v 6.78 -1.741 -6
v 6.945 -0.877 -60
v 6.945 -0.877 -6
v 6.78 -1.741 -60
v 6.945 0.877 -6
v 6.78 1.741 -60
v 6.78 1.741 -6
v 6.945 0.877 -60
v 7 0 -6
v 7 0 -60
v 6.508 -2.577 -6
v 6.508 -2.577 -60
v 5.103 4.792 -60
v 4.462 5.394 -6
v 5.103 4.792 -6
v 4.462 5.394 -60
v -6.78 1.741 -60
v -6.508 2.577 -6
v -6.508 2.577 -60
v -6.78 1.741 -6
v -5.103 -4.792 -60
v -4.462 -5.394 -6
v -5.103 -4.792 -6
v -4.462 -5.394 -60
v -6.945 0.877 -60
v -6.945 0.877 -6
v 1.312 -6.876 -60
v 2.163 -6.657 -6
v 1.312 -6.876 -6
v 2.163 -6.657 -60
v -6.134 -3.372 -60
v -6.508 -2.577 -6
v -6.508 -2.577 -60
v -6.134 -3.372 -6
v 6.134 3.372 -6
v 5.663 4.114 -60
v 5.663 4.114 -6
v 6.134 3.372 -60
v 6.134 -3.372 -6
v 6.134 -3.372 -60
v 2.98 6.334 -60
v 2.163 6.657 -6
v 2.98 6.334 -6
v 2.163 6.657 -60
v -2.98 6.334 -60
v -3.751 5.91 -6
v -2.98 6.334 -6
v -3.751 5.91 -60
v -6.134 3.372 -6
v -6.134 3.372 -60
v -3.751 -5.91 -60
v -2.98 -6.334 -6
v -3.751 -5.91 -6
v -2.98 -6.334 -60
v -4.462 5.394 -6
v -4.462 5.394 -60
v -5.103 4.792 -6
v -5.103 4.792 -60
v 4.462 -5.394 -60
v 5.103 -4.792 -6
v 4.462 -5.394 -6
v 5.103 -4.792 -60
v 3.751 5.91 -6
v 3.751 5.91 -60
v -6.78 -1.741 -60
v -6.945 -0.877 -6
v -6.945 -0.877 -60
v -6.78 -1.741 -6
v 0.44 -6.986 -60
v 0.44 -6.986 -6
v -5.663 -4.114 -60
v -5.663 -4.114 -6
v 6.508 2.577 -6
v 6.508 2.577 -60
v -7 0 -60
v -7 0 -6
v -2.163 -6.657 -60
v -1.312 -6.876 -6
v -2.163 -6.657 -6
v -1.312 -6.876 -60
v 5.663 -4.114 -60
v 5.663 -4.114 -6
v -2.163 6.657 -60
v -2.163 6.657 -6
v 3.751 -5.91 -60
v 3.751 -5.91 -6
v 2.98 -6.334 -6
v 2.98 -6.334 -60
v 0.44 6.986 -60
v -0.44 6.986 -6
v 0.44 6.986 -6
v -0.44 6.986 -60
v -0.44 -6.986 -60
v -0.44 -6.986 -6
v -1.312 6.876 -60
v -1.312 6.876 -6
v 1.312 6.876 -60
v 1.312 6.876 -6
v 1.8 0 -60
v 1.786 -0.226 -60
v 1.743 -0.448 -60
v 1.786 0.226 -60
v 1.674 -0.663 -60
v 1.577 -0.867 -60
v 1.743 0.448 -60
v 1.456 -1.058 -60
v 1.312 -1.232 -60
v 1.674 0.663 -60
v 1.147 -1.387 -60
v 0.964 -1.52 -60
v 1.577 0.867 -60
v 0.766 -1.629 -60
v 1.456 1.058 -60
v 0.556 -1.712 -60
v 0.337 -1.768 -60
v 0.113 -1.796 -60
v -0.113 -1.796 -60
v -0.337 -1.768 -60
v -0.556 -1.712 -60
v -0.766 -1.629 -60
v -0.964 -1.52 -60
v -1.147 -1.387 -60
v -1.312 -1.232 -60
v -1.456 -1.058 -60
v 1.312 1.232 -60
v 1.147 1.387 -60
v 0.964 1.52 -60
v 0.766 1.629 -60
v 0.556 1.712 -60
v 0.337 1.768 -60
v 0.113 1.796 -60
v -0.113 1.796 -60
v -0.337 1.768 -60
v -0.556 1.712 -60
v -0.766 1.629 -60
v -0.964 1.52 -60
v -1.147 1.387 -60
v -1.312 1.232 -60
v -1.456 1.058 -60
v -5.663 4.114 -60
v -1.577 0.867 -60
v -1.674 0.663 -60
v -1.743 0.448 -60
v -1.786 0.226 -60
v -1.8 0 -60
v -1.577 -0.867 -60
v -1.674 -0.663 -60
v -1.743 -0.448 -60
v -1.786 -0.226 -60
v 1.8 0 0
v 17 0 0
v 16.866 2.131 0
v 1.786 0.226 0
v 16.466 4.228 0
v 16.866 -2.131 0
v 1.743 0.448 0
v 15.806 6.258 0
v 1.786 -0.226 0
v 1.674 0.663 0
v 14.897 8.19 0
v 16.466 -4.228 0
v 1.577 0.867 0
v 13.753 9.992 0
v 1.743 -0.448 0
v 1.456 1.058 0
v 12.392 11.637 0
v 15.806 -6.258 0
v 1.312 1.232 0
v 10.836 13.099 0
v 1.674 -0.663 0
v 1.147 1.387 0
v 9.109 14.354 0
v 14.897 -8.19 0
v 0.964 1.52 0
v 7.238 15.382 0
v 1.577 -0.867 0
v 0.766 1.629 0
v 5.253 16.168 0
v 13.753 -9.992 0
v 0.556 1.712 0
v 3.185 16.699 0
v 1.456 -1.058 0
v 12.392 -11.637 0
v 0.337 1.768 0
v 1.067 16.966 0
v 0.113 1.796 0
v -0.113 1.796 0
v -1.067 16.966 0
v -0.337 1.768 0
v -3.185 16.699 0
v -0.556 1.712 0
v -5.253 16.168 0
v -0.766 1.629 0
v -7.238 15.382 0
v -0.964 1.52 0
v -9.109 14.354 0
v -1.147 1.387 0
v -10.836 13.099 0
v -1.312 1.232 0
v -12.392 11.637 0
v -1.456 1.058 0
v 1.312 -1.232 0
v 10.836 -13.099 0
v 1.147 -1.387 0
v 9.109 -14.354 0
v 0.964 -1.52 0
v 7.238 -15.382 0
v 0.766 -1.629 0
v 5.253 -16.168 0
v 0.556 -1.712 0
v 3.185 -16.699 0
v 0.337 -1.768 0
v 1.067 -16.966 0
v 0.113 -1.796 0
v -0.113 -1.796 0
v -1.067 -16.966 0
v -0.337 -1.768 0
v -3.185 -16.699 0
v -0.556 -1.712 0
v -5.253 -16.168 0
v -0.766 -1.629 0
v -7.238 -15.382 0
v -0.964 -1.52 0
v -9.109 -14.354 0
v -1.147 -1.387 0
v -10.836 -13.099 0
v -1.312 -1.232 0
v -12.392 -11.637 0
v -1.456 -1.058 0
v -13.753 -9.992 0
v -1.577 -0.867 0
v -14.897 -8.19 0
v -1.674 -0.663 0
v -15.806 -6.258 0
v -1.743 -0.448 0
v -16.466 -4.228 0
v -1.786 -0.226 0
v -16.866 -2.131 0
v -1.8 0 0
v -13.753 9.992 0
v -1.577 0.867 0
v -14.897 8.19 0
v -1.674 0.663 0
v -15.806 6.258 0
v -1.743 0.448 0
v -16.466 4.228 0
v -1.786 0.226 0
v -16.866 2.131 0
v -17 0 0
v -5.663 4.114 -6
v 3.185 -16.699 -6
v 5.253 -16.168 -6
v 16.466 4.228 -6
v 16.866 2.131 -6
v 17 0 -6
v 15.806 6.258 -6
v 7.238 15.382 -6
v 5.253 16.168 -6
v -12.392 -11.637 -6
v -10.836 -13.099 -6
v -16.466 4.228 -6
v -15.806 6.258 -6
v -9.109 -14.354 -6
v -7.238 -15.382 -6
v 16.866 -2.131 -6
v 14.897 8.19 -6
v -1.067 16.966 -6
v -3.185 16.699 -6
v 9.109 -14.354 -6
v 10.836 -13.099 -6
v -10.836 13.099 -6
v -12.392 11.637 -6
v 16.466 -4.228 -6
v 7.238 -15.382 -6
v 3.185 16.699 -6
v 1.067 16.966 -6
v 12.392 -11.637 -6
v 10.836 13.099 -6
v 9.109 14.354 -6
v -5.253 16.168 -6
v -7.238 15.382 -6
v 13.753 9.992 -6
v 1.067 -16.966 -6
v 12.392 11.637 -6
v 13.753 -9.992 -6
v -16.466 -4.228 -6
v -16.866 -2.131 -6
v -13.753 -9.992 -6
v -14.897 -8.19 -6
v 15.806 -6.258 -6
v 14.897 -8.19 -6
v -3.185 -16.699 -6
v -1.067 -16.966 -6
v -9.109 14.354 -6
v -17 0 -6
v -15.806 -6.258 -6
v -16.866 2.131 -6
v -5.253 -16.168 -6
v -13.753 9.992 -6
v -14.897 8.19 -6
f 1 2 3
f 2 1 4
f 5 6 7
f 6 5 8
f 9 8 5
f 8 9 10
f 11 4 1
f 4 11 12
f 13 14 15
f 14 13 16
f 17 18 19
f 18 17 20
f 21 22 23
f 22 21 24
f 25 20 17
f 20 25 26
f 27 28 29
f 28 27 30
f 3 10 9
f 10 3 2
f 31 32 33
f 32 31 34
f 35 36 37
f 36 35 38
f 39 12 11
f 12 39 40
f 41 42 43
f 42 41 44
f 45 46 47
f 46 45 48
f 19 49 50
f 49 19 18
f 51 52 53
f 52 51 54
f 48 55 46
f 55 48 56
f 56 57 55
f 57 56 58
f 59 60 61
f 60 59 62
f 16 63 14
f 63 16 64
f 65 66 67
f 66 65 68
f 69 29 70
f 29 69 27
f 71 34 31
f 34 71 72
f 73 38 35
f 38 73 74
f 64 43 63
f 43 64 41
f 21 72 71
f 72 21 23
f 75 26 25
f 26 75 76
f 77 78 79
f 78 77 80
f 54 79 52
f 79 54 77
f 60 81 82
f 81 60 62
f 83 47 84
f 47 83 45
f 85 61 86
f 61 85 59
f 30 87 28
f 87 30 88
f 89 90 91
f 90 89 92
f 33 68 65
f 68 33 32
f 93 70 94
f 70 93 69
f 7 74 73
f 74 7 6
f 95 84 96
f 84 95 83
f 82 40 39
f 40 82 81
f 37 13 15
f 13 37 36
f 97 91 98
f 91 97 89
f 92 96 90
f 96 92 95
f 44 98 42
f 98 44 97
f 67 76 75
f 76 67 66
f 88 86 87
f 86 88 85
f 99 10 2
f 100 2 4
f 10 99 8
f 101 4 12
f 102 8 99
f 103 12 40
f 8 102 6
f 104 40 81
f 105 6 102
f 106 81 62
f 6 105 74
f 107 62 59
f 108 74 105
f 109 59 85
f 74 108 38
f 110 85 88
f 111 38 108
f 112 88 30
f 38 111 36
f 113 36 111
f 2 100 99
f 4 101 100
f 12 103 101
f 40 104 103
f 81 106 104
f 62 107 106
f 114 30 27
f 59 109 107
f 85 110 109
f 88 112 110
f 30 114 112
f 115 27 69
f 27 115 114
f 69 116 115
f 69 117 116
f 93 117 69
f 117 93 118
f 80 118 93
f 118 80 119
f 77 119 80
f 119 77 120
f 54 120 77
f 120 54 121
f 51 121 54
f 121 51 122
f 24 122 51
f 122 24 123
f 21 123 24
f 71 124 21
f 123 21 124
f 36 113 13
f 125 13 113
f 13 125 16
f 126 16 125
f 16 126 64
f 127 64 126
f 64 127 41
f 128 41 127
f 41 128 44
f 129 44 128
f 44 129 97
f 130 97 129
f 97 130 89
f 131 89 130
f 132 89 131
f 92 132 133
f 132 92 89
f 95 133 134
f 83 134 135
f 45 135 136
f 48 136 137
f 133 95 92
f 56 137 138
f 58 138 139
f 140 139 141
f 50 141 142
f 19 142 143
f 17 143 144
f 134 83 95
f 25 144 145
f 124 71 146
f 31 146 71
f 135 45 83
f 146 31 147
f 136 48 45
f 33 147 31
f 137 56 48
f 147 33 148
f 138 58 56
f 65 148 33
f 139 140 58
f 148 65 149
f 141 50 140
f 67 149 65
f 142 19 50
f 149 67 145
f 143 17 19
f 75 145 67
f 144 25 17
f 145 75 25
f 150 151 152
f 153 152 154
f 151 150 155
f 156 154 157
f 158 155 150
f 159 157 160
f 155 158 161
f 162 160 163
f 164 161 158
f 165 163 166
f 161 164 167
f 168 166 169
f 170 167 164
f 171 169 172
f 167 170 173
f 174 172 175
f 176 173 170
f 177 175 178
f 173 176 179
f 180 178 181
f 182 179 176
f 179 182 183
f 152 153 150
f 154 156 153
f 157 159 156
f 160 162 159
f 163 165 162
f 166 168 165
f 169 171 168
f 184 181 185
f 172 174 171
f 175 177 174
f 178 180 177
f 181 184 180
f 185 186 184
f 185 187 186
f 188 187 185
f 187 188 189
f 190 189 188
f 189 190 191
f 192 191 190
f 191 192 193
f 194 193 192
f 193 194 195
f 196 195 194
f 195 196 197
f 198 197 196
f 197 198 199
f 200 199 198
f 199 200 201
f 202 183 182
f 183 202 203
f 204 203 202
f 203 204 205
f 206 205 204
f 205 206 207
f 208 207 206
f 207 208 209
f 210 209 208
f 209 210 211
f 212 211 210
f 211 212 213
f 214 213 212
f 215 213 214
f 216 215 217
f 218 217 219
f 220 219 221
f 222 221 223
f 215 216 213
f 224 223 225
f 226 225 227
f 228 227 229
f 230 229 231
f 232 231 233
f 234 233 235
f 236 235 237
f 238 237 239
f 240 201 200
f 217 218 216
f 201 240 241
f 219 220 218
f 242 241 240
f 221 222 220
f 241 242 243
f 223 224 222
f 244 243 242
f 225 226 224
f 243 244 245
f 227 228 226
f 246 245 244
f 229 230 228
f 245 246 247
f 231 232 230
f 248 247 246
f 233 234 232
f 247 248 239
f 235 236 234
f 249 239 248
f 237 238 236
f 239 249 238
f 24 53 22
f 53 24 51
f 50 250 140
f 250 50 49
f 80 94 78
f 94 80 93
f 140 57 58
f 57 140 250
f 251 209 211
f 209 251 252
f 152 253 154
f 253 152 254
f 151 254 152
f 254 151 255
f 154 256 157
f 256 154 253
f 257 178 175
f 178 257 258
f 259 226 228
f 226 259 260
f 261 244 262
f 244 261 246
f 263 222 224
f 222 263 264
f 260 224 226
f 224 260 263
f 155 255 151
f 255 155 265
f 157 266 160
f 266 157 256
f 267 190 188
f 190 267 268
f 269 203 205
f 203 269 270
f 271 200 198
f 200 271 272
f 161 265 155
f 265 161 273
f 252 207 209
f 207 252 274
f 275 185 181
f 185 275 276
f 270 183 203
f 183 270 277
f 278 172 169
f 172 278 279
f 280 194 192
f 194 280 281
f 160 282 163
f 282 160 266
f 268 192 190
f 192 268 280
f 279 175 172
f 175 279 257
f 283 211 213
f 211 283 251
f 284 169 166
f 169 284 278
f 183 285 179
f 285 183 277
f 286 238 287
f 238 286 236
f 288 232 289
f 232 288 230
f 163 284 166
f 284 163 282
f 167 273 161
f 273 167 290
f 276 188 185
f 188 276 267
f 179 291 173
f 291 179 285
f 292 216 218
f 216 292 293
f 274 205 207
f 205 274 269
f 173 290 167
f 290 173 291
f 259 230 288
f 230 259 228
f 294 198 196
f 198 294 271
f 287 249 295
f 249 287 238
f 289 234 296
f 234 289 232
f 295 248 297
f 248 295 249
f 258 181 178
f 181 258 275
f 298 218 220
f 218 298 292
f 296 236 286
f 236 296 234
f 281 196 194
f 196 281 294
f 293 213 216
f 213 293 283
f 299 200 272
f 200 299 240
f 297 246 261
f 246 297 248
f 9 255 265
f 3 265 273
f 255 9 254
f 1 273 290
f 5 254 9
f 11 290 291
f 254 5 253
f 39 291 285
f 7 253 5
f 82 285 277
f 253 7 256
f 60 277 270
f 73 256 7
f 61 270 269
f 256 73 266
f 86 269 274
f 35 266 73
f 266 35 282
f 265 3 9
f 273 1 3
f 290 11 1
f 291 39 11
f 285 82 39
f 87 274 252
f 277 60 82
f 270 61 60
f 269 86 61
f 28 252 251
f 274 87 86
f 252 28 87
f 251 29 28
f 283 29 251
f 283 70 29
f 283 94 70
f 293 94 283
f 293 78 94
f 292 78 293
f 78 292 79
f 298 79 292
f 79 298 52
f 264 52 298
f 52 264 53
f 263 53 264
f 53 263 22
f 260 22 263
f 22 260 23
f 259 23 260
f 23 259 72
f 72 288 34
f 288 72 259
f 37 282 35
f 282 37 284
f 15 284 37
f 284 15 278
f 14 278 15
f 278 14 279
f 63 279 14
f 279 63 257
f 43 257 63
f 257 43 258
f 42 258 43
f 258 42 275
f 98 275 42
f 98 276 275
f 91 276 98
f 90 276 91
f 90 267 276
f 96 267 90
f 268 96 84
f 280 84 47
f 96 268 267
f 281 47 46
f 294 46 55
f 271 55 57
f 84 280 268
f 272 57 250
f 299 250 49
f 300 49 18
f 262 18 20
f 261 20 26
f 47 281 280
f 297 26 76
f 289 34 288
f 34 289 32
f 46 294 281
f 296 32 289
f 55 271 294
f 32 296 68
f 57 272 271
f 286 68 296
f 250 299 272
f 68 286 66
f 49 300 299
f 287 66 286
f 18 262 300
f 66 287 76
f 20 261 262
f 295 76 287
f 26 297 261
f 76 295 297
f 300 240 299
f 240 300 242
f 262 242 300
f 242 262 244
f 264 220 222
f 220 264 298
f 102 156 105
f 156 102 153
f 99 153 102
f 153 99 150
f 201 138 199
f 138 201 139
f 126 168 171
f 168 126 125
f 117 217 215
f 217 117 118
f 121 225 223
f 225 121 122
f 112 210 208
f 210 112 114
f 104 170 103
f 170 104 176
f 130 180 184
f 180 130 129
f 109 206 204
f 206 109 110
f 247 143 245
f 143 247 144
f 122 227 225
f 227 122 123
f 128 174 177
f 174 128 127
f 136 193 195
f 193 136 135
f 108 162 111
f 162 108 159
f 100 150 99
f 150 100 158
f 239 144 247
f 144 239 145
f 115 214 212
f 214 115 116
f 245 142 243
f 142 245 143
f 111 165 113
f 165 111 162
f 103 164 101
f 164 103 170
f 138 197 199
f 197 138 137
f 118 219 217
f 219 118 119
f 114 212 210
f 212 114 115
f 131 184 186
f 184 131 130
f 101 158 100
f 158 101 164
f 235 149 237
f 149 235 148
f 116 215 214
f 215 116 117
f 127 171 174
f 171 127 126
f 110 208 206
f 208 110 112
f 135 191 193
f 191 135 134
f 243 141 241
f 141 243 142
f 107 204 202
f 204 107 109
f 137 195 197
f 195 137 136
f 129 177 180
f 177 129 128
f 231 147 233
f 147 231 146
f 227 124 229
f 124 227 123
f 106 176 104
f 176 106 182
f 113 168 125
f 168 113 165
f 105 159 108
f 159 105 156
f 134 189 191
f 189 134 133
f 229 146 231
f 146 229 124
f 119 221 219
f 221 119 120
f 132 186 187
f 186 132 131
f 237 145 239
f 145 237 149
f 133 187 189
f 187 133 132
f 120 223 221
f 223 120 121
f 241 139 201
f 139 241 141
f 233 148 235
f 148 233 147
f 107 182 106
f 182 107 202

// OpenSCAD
$fn = 50;


difference() {
	union() {
		translate(v = [0, 0, -60.0000000000]) {
			cylinder(h = 60, r = 7.0000000000);
		}
		translate(v = [0, 0, -6.0000000000]) {
			cylinder(h = 6, r = 17.0000000000);
		}
	}
	union() {
		#translate(v = [0, 0, -60]) {
			cylinder(h = 60, r = 1.8000000000);
		}
	}
}
